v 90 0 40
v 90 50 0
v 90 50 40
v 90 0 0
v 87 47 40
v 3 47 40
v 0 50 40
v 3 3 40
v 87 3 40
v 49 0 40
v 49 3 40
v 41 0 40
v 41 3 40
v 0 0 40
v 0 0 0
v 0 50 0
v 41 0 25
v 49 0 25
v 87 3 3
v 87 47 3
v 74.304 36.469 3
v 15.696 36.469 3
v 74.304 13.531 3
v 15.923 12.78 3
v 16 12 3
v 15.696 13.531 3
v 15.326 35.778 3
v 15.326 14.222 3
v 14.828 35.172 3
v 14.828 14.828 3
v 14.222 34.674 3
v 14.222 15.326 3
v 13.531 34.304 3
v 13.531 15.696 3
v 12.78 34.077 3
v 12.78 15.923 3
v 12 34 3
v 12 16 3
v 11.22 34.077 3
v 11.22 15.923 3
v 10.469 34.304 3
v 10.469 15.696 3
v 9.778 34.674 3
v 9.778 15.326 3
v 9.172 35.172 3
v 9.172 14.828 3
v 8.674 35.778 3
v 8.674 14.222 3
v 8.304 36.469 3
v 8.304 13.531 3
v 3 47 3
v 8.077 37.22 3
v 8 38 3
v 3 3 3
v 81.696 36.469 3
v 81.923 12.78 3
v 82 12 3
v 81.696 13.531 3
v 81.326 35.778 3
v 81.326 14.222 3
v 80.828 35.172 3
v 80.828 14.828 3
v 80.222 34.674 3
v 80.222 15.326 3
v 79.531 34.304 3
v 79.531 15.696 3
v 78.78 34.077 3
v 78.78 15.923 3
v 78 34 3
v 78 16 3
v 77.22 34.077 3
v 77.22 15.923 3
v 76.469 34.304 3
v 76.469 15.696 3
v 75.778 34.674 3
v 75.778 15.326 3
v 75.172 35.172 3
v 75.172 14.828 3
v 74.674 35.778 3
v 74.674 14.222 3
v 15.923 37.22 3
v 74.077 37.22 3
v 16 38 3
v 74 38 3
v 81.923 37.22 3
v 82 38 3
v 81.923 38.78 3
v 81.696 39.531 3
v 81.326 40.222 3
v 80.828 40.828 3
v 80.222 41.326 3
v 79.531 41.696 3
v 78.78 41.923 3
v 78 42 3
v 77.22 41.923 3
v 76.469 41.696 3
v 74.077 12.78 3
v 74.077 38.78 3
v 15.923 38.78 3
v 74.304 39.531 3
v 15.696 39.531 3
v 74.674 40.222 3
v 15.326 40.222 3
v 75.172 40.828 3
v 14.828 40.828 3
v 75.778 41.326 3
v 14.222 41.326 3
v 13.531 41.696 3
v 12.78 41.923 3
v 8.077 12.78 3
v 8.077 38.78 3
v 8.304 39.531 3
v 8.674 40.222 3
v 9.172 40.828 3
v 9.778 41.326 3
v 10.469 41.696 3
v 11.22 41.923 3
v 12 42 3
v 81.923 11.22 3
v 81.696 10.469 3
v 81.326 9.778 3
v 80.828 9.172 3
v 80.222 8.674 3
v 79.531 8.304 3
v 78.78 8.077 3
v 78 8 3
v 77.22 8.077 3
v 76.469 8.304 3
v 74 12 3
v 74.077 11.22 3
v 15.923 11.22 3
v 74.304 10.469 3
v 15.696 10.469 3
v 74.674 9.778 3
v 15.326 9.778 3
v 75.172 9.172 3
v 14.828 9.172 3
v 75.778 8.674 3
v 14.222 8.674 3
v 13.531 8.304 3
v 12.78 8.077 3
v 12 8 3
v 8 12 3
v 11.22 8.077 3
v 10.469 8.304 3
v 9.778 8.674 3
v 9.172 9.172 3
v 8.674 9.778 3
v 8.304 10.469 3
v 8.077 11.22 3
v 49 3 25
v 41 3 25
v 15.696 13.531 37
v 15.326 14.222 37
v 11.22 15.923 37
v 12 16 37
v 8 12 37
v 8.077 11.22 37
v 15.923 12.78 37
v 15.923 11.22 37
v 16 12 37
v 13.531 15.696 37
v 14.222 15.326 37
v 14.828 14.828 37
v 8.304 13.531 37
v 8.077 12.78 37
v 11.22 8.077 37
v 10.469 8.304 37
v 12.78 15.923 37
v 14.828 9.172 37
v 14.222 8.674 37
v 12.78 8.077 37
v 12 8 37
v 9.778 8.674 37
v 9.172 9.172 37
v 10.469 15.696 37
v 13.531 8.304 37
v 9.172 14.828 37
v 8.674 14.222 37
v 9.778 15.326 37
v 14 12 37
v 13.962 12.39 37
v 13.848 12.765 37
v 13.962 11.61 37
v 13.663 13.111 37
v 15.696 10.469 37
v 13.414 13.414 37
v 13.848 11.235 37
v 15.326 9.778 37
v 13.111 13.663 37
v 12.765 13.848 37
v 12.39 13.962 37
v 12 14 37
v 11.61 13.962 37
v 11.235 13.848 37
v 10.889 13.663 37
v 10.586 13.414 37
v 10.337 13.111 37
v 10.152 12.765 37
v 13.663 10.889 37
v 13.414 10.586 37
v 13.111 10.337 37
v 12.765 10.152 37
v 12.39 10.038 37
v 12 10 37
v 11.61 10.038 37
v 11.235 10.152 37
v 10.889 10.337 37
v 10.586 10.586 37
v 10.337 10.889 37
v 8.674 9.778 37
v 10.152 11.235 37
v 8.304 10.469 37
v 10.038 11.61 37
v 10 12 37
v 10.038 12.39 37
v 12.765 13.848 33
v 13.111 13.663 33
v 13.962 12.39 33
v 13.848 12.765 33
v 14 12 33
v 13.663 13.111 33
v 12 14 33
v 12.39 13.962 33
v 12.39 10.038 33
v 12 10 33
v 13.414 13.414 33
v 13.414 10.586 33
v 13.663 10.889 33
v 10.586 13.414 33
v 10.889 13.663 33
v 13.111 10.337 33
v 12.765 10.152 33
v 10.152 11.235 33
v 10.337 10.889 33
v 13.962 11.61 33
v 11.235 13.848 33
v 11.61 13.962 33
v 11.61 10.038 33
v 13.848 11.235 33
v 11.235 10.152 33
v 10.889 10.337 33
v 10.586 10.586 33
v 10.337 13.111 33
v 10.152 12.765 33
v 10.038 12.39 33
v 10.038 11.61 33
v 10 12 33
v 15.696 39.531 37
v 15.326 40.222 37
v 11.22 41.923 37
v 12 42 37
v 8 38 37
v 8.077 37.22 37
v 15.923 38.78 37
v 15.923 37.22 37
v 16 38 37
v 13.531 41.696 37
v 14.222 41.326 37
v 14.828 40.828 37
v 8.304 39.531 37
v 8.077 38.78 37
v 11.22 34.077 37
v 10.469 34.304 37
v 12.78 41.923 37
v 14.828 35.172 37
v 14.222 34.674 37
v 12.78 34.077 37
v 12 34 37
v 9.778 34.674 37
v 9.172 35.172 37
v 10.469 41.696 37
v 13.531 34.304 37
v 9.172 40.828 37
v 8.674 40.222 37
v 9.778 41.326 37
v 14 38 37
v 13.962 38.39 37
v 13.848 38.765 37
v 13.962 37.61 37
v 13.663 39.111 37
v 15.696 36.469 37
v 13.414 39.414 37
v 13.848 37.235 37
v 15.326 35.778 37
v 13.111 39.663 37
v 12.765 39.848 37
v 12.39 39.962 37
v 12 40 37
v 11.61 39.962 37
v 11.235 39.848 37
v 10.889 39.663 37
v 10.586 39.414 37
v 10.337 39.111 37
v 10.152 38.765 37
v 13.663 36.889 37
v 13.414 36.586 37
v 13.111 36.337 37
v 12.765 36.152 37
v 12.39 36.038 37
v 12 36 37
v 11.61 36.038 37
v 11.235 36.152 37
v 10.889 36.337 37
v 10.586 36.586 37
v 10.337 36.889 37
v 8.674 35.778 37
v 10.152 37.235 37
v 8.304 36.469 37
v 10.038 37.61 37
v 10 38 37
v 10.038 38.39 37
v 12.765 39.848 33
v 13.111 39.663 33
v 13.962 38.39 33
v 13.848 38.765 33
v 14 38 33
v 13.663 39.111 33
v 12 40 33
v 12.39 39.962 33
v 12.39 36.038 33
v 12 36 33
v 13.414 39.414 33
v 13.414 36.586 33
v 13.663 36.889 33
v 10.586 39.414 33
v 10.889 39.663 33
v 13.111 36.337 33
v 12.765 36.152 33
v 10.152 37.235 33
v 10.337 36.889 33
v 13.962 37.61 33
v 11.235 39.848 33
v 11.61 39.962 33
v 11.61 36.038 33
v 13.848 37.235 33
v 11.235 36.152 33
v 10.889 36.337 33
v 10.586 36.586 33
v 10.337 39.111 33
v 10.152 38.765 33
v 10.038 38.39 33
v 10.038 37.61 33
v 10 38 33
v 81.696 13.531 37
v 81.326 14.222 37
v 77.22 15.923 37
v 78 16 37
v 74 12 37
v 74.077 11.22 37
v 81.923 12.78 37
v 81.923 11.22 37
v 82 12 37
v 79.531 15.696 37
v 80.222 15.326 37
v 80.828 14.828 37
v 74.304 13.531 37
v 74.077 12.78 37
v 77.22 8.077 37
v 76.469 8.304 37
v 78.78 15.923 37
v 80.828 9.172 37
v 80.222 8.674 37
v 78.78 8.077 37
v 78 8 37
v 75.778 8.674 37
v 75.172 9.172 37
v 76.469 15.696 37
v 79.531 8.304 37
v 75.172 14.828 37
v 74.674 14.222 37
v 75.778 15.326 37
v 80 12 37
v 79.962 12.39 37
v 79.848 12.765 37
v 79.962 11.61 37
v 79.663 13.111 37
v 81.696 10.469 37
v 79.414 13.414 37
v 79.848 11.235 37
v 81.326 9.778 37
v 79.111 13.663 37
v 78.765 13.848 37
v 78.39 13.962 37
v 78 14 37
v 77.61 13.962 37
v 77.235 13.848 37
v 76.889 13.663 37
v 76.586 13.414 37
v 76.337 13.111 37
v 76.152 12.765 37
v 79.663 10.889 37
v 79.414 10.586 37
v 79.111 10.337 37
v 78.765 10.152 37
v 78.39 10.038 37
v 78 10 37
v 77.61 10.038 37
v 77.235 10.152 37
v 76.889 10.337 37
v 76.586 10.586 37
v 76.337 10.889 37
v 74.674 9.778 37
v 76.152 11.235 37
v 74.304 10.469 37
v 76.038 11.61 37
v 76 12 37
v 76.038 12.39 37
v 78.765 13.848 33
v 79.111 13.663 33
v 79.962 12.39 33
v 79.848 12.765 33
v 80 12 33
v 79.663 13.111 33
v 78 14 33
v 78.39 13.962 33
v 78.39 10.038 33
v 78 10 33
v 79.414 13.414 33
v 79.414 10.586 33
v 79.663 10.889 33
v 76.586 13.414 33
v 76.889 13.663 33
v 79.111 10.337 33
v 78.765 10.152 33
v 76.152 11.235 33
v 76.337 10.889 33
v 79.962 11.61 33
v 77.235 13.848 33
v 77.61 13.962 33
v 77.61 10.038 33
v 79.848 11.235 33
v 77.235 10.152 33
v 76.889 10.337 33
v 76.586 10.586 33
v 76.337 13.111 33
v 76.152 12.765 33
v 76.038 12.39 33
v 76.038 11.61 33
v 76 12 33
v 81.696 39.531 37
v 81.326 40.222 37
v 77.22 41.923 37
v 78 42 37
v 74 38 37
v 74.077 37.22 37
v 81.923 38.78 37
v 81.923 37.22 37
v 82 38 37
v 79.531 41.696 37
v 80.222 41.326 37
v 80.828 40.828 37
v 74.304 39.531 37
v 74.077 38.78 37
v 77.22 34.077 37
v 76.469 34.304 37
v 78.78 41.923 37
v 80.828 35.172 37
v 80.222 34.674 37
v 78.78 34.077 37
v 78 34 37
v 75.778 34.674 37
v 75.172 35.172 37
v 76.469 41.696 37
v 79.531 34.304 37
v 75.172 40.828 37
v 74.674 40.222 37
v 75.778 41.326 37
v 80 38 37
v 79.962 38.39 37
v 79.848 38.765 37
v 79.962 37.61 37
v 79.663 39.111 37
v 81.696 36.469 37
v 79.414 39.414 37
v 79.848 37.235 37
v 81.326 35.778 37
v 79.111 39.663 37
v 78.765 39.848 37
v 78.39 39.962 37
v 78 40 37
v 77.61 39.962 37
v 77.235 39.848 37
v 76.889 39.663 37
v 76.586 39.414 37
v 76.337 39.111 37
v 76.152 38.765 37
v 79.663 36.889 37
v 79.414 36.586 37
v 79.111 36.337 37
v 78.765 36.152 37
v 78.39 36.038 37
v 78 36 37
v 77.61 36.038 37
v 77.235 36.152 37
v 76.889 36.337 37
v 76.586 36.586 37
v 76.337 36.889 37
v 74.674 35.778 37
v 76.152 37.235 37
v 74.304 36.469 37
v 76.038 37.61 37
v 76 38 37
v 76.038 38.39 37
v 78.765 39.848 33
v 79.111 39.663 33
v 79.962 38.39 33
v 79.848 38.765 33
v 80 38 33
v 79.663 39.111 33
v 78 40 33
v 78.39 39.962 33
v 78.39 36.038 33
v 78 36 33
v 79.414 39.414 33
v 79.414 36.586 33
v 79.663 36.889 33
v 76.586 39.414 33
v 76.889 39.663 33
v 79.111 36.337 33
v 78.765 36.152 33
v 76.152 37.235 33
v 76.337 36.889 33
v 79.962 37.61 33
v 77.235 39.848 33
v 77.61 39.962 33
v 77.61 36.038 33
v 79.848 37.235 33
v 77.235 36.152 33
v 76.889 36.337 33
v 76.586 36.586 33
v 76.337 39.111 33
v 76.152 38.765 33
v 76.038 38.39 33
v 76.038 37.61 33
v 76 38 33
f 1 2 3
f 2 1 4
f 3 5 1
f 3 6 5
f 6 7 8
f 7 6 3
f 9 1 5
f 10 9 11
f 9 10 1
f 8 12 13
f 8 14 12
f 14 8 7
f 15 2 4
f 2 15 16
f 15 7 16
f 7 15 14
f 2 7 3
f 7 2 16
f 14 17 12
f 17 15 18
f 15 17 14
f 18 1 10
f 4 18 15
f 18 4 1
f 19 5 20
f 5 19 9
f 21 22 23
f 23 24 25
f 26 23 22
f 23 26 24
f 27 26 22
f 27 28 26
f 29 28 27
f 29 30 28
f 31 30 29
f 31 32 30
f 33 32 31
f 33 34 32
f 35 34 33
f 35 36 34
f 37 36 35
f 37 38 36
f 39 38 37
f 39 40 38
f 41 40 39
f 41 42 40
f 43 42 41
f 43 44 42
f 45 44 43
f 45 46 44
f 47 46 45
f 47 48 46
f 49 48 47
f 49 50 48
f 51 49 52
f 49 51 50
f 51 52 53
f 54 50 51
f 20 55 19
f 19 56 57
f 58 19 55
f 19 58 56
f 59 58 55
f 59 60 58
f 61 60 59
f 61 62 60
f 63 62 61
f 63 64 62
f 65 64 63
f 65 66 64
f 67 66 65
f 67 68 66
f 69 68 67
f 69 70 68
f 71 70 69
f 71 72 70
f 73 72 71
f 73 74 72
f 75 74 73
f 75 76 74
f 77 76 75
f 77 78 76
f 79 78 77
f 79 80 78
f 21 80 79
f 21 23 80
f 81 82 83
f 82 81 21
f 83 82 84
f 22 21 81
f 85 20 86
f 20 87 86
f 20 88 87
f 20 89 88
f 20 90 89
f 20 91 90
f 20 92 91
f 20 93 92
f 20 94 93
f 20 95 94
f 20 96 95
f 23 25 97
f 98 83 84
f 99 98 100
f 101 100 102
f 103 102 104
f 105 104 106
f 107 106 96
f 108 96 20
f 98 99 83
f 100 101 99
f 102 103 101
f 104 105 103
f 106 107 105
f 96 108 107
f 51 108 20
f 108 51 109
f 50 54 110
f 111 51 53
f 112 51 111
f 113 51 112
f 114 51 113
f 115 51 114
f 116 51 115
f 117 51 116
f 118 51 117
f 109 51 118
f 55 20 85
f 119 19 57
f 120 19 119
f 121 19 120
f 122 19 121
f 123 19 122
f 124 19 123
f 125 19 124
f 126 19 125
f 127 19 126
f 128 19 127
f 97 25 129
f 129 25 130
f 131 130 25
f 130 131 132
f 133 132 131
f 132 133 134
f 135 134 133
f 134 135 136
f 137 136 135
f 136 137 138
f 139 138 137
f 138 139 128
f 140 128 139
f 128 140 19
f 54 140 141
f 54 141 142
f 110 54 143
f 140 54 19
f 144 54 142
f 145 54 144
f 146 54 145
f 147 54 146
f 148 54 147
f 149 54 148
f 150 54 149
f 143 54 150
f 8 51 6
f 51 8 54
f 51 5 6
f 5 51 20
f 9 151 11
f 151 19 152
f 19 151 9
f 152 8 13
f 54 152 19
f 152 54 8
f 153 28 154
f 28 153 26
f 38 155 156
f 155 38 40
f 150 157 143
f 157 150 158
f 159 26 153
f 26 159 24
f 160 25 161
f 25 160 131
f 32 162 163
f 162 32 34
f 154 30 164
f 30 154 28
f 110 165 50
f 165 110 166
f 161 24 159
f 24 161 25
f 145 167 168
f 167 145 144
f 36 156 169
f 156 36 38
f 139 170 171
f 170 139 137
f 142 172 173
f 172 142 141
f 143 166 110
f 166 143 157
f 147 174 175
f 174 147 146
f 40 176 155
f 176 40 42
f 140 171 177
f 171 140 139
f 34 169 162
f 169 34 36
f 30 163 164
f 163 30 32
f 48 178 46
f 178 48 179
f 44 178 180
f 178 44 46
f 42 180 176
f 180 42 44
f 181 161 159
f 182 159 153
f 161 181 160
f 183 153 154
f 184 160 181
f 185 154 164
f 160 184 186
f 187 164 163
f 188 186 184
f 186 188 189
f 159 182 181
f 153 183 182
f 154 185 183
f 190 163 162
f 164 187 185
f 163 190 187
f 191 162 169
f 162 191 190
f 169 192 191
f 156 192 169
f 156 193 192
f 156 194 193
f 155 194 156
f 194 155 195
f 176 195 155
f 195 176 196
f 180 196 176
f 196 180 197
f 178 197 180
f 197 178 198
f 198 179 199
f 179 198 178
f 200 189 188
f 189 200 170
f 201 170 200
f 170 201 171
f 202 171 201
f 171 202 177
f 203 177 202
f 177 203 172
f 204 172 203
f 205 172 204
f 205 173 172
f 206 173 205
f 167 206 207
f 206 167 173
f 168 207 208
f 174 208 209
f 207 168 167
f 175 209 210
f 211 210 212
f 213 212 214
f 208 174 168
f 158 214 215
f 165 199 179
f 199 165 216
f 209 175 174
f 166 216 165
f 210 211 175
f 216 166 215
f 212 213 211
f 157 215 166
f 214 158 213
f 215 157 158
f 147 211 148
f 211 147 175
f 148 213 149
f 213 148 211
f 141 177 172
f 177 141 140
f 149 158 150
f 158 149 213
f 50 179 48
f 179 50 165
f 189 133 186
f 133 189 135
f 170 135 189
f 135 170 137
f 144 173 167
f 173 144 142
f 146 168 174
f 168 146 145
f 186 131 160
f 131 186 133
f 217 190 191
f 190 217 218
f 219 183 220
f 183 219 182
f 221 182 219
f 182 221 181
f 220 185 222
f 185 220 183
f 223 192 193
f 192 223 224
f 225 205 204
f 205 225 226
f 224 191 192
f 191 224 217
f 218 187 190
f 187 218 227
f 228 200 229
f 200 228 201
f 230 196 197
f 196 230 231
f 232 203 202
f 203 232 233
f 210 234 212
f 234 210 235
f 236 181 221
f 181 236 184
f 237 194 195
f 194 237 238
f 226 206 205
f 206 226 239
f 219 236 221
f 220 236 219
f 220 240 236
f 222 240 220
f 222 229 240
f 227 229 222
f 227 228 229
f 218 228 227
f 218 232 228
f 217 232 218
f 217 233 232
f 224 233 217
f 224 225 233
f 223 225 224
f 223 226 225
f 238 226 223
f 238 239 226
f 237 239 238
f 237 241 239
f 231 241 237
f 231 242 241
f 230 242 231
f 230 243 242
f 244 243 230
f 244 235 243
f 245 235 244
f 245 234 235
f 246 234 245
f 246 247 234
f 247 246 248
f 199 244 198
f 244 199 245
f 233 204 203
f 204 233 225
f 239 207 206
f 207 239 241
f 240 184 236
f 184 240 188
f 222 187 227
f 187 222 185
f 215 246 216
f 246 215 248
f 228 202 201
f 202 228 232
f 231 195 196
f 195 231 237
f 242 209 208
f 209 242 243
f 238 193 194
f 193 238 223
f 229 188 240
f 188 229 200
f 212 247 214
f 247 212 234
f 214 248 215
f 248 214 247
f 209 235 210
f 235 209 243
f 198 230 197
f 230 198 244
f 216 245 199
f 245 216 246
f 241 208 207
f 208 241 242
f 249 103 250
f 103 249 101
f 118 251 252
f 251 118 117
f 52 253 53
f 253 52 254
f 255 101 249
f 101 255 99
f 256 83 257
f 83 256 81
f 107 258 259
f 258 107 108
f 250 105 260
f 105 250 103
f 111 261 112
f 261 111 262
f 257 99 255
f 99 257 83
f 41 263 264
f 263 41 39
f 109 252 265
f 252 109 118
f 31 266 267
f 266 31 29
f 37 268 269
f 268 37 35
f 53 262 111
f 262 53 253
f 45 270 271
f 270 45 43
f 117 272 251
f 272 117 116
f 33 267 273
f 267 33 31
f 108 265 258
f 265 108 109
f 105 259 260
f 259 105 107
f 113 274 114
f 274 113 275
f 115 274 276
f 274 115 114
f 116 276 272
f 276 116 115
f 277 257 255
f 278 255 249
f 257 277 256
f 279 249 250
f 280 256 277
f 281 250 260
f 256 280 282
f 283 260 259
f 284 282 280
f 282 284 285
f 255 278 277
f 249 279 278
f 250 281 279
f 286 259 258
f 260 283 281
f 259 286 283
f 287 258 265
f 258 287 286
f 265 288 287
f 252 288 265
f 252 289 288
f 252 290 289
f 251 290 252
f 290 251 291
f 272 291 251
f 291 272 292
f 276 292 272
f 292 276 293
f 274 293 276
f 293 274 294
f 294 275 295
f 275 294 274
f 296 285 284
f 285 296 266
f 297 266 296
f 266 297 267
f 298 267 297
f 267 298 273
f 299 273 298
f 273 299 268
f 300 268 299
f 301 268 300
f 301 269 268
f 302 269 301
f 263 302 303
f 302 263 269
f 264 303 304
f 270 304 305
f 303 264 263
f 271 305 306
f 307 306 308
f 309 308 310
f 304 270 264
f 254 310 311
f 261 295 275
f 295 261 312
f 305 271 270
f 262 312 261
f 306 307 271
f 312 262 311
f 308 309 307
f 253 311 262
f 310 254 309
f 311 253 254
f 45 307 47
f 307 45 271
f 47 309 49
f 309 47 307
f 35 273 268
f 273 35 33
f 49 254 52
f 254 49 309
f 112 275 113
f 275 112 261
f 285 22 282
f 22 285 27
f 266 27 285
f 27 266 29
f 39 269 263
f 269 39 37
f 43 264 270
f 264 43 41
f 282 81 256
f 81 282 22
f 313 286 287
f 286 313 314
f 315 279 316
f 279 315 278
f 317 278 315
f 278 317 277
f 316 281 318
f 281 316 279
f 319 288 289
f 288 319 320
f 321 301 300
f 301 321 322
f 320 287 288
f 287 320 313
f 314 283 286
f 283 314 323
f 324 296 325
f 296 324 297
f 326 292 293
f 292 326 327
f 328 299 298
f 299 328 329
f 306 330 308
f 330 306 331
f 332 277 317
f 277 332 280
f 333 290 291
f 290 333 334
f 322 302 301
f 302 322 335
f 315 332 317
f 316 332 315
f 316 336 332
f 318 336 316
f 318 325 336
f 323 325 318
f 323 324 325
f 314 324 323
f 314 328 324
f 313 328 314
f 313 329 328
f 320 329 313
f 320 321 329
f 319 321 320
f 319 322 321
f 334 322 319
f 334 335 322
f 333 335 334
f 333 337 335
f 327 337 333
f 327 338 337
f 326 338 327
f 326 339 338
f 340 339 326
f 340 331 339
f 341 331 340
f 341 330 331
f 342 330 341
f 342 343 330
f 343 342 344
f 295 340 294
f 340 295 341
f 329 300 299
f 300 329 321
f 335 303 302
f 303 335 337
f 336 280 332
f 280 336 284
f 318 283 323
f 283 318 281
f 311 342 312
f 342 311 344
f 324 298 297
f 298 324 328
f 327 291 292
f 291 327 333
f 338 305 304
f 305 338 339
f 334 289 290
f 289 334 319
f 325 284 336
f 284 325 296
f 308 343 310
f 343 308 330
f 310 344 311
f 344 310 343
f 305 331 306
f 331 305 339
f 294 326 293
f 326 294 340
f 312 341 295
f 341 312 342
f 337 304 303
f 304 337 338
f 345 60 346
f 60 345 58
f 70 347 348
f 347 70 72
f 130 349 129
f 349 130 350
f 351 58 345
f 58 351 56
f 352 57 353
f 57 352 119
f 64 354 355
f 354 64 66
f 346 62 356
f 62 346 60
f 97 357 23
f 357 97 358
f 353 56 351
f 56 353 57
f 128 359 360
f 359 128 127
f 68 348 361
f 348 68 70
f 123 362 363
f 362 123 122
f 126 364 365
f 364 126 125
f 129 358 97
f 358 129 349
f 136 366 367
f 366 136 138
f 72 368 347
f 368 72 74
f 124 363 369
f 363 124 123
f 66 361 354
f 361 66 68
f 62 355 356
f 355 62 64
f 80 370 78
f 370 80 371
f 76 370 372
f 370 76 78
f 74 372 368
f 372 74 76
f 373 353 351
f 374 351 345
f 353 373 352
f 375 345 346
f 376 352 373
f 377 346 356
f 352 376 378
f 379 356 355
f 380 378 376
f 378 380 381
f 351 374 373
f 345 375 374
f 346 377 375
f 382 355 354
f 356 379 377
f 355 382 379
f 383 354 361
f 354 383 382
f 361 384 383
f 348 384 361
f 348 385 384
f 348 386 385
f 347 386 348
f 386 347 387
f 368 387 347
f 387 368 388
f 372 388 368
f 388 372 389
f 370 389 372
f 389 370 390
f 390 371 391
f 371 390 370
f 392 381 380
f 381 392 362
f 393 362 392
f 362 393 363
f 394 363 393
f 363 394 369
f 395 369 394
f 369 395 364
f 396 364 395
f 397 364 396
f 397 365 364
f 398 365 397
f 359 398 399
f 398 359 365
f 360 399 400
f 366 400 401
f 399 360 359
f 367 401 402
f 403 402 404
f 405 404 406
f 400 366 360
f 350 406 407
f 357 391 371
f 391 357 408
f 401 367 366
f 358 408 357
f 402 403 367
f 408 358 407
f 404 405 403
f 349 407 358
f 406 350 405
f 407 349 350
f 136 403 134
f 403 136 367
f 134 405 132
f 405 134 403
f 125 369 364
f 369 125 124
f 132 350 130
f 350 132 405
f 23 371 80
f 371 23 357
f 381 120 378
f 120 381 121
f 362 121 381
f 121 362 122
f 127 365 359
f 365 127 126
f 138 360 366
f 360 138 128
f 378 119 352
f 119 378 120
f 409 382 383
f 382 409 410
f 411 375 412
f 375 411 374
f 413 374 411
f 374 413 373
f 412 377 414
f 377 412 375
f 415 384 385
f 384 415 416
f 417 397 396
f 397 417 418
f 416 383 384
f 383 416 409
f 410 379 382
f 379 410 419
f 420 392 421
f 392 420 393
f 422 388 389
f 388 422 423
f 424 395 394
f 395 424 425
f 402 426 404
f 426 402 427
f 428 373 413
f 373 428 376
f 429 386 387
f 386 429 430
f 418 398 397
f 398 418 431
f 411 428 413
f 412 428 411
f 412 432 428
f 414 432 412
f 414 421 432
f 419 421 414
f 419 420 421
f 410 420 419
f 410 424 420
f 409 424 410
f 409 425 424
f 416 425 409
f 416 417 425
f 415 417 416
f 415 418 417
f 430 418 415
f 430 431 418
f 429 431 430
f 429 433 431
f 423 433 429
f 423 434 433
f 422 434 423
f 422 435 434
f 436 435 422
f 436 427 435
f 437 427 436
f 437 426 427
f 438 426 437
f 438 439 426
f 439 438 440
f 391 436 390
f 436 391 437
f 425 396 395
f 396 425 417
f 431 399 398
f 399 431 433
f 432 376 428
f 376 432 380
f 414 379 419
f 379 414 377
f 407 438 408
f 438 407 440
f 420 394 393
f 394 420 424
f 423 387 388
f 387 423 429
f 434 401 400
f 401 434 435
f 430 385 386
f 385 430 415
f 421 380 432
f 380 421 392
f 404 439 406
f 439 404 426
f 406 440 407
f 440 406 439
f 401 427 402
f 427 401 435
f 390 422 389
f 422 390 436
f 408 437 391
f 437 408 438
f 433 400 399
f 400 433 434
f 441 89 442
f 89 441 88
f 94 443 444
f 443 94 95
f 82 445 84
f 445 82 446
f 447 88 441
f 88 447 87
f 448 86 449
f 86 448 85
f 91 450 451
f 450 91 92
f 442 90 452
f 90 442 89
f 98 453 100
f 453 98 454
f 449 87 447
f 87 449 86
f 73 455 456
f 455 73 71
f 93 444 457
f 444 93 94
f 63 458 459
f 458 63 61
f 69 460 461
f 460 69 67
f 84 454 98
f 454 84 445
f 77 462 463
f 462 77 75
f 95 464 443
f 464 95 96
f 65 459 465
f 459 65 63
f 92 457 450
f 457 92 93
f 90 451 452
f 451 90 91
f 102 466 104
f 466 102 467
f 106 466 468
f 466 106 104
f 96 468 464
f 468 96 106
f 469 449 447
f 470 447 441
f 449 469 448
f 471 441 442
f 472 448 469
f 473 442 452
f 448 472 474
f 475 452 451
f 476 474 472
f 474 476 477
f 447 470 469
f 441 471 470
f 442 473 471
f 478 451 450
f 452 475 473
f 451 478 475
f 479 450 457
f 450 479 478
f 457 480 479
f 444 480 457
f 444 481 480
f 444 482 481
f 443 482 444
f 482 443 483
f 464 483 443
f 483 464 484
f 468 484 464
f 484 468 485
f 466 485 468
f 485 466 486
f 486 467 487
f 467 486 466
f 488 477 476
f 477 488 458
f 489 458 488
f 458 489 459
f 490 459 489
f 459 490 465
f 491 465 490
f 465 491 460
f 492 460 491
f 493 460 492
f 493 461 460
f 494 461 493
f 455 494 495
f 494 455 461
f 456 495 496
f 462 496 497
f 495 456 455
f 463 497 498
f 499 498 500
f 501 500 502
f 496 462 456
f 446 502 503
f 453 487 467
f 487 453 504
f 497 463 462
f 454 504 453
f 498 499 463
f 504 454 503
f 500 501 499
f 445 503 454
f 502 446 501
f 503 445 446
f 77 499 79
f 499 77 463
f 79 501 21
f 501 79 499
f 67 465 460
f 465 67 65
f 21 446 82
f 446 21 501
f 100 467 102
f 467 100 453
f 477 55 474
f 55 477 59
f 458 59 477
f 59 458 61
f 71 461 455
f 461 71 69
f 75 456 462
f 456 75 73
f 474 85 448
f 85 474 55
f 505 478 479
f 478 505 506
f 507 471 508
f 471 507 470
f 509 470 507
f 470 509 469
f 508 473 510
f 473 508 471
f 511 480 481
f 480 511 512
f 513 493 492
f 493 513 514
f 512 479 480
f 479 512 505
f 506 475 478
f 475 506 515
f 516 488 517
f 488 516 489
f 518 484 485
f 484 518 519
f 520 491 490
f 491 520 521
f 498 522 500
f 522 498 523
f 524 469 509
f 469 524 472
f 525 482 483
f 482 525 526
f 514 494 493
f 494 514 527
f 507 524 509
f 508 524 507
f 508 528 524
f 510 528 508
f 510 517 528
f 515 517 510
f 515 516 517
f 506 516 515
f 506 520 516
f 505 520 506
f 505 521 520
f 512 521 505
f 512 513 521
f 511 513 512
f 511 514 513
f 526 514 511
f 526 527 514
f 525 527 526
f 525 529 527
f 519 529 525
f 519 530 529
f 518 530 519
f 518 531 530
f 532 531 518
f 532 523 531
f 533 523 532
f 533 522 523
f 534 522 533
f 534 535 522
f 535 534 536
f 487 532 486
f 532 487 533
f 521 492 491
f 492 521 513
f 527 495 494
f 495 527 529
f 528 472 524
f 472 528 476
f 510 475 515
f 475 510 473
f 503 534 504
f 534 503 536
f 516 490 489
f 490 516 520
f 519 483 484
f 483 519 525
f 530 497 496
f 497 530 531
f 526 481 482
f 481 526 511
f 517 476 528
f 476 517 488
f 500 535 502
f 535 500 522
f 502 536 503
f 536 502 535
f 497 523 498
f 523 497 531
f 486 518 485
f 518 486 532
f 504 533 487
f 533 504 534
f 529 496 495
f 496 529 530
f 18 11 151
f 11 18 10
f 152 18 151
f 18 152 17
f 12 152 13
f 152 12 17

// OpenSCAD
$fn = 32;

// ----------------------------------------------------------------------
// Enclosure box: both enclosure
// ----------------------------------------------------------------------

// --- parameters (mm) ---
box_l = 90;               // outer length, X
box_w = 50;               // outer width, Y
box_h = 40;               // outer height
wall_t = 3;               // wall thickness
boss_r = 4;               // corner boss radius
hole_r = 2;               // boss screw hole radius
boss_in = 12;             // boss inset from the corners
notch_w = 8;              // cable notch width
notch_h = 15;             // cable notch height
fit_tol = 0.02;           // tolerance for press fits, mm
free_tol = 0.2;           // tolerance for clearance fits, mm

inner_h = box_h - wall_t;  // cavity depth
boss_h = inner_h - 2;  // corner boss height

difference() {
  union() {
    difference() {
      cube([box_l, box_w, box_h]);
      translate([wall_t, wall_t, wall_t])
        cube([box_l - 2 * wall_t, box_w - 2 * wall_t, box_h]);
    }
    for (sx = [0, 1], sy = [0, 1])
      translate([sx ? box_l - boss_in : boss_in,
                 sy ? box_w - boss_in : boss_in, wall_t - 1])
        difference() {
          cylinder(r = boss_r, h = boss_h);
          translate([0, 0, boss_h - 4])
            cylinder(r = hole_r, h = 5);
        }
  }
  translate([box_l / 2 - notch_w / 2, -1, box_h - notch_h])
    cube([notch_w, wall_t + 2, notch_h + 1]);
}
